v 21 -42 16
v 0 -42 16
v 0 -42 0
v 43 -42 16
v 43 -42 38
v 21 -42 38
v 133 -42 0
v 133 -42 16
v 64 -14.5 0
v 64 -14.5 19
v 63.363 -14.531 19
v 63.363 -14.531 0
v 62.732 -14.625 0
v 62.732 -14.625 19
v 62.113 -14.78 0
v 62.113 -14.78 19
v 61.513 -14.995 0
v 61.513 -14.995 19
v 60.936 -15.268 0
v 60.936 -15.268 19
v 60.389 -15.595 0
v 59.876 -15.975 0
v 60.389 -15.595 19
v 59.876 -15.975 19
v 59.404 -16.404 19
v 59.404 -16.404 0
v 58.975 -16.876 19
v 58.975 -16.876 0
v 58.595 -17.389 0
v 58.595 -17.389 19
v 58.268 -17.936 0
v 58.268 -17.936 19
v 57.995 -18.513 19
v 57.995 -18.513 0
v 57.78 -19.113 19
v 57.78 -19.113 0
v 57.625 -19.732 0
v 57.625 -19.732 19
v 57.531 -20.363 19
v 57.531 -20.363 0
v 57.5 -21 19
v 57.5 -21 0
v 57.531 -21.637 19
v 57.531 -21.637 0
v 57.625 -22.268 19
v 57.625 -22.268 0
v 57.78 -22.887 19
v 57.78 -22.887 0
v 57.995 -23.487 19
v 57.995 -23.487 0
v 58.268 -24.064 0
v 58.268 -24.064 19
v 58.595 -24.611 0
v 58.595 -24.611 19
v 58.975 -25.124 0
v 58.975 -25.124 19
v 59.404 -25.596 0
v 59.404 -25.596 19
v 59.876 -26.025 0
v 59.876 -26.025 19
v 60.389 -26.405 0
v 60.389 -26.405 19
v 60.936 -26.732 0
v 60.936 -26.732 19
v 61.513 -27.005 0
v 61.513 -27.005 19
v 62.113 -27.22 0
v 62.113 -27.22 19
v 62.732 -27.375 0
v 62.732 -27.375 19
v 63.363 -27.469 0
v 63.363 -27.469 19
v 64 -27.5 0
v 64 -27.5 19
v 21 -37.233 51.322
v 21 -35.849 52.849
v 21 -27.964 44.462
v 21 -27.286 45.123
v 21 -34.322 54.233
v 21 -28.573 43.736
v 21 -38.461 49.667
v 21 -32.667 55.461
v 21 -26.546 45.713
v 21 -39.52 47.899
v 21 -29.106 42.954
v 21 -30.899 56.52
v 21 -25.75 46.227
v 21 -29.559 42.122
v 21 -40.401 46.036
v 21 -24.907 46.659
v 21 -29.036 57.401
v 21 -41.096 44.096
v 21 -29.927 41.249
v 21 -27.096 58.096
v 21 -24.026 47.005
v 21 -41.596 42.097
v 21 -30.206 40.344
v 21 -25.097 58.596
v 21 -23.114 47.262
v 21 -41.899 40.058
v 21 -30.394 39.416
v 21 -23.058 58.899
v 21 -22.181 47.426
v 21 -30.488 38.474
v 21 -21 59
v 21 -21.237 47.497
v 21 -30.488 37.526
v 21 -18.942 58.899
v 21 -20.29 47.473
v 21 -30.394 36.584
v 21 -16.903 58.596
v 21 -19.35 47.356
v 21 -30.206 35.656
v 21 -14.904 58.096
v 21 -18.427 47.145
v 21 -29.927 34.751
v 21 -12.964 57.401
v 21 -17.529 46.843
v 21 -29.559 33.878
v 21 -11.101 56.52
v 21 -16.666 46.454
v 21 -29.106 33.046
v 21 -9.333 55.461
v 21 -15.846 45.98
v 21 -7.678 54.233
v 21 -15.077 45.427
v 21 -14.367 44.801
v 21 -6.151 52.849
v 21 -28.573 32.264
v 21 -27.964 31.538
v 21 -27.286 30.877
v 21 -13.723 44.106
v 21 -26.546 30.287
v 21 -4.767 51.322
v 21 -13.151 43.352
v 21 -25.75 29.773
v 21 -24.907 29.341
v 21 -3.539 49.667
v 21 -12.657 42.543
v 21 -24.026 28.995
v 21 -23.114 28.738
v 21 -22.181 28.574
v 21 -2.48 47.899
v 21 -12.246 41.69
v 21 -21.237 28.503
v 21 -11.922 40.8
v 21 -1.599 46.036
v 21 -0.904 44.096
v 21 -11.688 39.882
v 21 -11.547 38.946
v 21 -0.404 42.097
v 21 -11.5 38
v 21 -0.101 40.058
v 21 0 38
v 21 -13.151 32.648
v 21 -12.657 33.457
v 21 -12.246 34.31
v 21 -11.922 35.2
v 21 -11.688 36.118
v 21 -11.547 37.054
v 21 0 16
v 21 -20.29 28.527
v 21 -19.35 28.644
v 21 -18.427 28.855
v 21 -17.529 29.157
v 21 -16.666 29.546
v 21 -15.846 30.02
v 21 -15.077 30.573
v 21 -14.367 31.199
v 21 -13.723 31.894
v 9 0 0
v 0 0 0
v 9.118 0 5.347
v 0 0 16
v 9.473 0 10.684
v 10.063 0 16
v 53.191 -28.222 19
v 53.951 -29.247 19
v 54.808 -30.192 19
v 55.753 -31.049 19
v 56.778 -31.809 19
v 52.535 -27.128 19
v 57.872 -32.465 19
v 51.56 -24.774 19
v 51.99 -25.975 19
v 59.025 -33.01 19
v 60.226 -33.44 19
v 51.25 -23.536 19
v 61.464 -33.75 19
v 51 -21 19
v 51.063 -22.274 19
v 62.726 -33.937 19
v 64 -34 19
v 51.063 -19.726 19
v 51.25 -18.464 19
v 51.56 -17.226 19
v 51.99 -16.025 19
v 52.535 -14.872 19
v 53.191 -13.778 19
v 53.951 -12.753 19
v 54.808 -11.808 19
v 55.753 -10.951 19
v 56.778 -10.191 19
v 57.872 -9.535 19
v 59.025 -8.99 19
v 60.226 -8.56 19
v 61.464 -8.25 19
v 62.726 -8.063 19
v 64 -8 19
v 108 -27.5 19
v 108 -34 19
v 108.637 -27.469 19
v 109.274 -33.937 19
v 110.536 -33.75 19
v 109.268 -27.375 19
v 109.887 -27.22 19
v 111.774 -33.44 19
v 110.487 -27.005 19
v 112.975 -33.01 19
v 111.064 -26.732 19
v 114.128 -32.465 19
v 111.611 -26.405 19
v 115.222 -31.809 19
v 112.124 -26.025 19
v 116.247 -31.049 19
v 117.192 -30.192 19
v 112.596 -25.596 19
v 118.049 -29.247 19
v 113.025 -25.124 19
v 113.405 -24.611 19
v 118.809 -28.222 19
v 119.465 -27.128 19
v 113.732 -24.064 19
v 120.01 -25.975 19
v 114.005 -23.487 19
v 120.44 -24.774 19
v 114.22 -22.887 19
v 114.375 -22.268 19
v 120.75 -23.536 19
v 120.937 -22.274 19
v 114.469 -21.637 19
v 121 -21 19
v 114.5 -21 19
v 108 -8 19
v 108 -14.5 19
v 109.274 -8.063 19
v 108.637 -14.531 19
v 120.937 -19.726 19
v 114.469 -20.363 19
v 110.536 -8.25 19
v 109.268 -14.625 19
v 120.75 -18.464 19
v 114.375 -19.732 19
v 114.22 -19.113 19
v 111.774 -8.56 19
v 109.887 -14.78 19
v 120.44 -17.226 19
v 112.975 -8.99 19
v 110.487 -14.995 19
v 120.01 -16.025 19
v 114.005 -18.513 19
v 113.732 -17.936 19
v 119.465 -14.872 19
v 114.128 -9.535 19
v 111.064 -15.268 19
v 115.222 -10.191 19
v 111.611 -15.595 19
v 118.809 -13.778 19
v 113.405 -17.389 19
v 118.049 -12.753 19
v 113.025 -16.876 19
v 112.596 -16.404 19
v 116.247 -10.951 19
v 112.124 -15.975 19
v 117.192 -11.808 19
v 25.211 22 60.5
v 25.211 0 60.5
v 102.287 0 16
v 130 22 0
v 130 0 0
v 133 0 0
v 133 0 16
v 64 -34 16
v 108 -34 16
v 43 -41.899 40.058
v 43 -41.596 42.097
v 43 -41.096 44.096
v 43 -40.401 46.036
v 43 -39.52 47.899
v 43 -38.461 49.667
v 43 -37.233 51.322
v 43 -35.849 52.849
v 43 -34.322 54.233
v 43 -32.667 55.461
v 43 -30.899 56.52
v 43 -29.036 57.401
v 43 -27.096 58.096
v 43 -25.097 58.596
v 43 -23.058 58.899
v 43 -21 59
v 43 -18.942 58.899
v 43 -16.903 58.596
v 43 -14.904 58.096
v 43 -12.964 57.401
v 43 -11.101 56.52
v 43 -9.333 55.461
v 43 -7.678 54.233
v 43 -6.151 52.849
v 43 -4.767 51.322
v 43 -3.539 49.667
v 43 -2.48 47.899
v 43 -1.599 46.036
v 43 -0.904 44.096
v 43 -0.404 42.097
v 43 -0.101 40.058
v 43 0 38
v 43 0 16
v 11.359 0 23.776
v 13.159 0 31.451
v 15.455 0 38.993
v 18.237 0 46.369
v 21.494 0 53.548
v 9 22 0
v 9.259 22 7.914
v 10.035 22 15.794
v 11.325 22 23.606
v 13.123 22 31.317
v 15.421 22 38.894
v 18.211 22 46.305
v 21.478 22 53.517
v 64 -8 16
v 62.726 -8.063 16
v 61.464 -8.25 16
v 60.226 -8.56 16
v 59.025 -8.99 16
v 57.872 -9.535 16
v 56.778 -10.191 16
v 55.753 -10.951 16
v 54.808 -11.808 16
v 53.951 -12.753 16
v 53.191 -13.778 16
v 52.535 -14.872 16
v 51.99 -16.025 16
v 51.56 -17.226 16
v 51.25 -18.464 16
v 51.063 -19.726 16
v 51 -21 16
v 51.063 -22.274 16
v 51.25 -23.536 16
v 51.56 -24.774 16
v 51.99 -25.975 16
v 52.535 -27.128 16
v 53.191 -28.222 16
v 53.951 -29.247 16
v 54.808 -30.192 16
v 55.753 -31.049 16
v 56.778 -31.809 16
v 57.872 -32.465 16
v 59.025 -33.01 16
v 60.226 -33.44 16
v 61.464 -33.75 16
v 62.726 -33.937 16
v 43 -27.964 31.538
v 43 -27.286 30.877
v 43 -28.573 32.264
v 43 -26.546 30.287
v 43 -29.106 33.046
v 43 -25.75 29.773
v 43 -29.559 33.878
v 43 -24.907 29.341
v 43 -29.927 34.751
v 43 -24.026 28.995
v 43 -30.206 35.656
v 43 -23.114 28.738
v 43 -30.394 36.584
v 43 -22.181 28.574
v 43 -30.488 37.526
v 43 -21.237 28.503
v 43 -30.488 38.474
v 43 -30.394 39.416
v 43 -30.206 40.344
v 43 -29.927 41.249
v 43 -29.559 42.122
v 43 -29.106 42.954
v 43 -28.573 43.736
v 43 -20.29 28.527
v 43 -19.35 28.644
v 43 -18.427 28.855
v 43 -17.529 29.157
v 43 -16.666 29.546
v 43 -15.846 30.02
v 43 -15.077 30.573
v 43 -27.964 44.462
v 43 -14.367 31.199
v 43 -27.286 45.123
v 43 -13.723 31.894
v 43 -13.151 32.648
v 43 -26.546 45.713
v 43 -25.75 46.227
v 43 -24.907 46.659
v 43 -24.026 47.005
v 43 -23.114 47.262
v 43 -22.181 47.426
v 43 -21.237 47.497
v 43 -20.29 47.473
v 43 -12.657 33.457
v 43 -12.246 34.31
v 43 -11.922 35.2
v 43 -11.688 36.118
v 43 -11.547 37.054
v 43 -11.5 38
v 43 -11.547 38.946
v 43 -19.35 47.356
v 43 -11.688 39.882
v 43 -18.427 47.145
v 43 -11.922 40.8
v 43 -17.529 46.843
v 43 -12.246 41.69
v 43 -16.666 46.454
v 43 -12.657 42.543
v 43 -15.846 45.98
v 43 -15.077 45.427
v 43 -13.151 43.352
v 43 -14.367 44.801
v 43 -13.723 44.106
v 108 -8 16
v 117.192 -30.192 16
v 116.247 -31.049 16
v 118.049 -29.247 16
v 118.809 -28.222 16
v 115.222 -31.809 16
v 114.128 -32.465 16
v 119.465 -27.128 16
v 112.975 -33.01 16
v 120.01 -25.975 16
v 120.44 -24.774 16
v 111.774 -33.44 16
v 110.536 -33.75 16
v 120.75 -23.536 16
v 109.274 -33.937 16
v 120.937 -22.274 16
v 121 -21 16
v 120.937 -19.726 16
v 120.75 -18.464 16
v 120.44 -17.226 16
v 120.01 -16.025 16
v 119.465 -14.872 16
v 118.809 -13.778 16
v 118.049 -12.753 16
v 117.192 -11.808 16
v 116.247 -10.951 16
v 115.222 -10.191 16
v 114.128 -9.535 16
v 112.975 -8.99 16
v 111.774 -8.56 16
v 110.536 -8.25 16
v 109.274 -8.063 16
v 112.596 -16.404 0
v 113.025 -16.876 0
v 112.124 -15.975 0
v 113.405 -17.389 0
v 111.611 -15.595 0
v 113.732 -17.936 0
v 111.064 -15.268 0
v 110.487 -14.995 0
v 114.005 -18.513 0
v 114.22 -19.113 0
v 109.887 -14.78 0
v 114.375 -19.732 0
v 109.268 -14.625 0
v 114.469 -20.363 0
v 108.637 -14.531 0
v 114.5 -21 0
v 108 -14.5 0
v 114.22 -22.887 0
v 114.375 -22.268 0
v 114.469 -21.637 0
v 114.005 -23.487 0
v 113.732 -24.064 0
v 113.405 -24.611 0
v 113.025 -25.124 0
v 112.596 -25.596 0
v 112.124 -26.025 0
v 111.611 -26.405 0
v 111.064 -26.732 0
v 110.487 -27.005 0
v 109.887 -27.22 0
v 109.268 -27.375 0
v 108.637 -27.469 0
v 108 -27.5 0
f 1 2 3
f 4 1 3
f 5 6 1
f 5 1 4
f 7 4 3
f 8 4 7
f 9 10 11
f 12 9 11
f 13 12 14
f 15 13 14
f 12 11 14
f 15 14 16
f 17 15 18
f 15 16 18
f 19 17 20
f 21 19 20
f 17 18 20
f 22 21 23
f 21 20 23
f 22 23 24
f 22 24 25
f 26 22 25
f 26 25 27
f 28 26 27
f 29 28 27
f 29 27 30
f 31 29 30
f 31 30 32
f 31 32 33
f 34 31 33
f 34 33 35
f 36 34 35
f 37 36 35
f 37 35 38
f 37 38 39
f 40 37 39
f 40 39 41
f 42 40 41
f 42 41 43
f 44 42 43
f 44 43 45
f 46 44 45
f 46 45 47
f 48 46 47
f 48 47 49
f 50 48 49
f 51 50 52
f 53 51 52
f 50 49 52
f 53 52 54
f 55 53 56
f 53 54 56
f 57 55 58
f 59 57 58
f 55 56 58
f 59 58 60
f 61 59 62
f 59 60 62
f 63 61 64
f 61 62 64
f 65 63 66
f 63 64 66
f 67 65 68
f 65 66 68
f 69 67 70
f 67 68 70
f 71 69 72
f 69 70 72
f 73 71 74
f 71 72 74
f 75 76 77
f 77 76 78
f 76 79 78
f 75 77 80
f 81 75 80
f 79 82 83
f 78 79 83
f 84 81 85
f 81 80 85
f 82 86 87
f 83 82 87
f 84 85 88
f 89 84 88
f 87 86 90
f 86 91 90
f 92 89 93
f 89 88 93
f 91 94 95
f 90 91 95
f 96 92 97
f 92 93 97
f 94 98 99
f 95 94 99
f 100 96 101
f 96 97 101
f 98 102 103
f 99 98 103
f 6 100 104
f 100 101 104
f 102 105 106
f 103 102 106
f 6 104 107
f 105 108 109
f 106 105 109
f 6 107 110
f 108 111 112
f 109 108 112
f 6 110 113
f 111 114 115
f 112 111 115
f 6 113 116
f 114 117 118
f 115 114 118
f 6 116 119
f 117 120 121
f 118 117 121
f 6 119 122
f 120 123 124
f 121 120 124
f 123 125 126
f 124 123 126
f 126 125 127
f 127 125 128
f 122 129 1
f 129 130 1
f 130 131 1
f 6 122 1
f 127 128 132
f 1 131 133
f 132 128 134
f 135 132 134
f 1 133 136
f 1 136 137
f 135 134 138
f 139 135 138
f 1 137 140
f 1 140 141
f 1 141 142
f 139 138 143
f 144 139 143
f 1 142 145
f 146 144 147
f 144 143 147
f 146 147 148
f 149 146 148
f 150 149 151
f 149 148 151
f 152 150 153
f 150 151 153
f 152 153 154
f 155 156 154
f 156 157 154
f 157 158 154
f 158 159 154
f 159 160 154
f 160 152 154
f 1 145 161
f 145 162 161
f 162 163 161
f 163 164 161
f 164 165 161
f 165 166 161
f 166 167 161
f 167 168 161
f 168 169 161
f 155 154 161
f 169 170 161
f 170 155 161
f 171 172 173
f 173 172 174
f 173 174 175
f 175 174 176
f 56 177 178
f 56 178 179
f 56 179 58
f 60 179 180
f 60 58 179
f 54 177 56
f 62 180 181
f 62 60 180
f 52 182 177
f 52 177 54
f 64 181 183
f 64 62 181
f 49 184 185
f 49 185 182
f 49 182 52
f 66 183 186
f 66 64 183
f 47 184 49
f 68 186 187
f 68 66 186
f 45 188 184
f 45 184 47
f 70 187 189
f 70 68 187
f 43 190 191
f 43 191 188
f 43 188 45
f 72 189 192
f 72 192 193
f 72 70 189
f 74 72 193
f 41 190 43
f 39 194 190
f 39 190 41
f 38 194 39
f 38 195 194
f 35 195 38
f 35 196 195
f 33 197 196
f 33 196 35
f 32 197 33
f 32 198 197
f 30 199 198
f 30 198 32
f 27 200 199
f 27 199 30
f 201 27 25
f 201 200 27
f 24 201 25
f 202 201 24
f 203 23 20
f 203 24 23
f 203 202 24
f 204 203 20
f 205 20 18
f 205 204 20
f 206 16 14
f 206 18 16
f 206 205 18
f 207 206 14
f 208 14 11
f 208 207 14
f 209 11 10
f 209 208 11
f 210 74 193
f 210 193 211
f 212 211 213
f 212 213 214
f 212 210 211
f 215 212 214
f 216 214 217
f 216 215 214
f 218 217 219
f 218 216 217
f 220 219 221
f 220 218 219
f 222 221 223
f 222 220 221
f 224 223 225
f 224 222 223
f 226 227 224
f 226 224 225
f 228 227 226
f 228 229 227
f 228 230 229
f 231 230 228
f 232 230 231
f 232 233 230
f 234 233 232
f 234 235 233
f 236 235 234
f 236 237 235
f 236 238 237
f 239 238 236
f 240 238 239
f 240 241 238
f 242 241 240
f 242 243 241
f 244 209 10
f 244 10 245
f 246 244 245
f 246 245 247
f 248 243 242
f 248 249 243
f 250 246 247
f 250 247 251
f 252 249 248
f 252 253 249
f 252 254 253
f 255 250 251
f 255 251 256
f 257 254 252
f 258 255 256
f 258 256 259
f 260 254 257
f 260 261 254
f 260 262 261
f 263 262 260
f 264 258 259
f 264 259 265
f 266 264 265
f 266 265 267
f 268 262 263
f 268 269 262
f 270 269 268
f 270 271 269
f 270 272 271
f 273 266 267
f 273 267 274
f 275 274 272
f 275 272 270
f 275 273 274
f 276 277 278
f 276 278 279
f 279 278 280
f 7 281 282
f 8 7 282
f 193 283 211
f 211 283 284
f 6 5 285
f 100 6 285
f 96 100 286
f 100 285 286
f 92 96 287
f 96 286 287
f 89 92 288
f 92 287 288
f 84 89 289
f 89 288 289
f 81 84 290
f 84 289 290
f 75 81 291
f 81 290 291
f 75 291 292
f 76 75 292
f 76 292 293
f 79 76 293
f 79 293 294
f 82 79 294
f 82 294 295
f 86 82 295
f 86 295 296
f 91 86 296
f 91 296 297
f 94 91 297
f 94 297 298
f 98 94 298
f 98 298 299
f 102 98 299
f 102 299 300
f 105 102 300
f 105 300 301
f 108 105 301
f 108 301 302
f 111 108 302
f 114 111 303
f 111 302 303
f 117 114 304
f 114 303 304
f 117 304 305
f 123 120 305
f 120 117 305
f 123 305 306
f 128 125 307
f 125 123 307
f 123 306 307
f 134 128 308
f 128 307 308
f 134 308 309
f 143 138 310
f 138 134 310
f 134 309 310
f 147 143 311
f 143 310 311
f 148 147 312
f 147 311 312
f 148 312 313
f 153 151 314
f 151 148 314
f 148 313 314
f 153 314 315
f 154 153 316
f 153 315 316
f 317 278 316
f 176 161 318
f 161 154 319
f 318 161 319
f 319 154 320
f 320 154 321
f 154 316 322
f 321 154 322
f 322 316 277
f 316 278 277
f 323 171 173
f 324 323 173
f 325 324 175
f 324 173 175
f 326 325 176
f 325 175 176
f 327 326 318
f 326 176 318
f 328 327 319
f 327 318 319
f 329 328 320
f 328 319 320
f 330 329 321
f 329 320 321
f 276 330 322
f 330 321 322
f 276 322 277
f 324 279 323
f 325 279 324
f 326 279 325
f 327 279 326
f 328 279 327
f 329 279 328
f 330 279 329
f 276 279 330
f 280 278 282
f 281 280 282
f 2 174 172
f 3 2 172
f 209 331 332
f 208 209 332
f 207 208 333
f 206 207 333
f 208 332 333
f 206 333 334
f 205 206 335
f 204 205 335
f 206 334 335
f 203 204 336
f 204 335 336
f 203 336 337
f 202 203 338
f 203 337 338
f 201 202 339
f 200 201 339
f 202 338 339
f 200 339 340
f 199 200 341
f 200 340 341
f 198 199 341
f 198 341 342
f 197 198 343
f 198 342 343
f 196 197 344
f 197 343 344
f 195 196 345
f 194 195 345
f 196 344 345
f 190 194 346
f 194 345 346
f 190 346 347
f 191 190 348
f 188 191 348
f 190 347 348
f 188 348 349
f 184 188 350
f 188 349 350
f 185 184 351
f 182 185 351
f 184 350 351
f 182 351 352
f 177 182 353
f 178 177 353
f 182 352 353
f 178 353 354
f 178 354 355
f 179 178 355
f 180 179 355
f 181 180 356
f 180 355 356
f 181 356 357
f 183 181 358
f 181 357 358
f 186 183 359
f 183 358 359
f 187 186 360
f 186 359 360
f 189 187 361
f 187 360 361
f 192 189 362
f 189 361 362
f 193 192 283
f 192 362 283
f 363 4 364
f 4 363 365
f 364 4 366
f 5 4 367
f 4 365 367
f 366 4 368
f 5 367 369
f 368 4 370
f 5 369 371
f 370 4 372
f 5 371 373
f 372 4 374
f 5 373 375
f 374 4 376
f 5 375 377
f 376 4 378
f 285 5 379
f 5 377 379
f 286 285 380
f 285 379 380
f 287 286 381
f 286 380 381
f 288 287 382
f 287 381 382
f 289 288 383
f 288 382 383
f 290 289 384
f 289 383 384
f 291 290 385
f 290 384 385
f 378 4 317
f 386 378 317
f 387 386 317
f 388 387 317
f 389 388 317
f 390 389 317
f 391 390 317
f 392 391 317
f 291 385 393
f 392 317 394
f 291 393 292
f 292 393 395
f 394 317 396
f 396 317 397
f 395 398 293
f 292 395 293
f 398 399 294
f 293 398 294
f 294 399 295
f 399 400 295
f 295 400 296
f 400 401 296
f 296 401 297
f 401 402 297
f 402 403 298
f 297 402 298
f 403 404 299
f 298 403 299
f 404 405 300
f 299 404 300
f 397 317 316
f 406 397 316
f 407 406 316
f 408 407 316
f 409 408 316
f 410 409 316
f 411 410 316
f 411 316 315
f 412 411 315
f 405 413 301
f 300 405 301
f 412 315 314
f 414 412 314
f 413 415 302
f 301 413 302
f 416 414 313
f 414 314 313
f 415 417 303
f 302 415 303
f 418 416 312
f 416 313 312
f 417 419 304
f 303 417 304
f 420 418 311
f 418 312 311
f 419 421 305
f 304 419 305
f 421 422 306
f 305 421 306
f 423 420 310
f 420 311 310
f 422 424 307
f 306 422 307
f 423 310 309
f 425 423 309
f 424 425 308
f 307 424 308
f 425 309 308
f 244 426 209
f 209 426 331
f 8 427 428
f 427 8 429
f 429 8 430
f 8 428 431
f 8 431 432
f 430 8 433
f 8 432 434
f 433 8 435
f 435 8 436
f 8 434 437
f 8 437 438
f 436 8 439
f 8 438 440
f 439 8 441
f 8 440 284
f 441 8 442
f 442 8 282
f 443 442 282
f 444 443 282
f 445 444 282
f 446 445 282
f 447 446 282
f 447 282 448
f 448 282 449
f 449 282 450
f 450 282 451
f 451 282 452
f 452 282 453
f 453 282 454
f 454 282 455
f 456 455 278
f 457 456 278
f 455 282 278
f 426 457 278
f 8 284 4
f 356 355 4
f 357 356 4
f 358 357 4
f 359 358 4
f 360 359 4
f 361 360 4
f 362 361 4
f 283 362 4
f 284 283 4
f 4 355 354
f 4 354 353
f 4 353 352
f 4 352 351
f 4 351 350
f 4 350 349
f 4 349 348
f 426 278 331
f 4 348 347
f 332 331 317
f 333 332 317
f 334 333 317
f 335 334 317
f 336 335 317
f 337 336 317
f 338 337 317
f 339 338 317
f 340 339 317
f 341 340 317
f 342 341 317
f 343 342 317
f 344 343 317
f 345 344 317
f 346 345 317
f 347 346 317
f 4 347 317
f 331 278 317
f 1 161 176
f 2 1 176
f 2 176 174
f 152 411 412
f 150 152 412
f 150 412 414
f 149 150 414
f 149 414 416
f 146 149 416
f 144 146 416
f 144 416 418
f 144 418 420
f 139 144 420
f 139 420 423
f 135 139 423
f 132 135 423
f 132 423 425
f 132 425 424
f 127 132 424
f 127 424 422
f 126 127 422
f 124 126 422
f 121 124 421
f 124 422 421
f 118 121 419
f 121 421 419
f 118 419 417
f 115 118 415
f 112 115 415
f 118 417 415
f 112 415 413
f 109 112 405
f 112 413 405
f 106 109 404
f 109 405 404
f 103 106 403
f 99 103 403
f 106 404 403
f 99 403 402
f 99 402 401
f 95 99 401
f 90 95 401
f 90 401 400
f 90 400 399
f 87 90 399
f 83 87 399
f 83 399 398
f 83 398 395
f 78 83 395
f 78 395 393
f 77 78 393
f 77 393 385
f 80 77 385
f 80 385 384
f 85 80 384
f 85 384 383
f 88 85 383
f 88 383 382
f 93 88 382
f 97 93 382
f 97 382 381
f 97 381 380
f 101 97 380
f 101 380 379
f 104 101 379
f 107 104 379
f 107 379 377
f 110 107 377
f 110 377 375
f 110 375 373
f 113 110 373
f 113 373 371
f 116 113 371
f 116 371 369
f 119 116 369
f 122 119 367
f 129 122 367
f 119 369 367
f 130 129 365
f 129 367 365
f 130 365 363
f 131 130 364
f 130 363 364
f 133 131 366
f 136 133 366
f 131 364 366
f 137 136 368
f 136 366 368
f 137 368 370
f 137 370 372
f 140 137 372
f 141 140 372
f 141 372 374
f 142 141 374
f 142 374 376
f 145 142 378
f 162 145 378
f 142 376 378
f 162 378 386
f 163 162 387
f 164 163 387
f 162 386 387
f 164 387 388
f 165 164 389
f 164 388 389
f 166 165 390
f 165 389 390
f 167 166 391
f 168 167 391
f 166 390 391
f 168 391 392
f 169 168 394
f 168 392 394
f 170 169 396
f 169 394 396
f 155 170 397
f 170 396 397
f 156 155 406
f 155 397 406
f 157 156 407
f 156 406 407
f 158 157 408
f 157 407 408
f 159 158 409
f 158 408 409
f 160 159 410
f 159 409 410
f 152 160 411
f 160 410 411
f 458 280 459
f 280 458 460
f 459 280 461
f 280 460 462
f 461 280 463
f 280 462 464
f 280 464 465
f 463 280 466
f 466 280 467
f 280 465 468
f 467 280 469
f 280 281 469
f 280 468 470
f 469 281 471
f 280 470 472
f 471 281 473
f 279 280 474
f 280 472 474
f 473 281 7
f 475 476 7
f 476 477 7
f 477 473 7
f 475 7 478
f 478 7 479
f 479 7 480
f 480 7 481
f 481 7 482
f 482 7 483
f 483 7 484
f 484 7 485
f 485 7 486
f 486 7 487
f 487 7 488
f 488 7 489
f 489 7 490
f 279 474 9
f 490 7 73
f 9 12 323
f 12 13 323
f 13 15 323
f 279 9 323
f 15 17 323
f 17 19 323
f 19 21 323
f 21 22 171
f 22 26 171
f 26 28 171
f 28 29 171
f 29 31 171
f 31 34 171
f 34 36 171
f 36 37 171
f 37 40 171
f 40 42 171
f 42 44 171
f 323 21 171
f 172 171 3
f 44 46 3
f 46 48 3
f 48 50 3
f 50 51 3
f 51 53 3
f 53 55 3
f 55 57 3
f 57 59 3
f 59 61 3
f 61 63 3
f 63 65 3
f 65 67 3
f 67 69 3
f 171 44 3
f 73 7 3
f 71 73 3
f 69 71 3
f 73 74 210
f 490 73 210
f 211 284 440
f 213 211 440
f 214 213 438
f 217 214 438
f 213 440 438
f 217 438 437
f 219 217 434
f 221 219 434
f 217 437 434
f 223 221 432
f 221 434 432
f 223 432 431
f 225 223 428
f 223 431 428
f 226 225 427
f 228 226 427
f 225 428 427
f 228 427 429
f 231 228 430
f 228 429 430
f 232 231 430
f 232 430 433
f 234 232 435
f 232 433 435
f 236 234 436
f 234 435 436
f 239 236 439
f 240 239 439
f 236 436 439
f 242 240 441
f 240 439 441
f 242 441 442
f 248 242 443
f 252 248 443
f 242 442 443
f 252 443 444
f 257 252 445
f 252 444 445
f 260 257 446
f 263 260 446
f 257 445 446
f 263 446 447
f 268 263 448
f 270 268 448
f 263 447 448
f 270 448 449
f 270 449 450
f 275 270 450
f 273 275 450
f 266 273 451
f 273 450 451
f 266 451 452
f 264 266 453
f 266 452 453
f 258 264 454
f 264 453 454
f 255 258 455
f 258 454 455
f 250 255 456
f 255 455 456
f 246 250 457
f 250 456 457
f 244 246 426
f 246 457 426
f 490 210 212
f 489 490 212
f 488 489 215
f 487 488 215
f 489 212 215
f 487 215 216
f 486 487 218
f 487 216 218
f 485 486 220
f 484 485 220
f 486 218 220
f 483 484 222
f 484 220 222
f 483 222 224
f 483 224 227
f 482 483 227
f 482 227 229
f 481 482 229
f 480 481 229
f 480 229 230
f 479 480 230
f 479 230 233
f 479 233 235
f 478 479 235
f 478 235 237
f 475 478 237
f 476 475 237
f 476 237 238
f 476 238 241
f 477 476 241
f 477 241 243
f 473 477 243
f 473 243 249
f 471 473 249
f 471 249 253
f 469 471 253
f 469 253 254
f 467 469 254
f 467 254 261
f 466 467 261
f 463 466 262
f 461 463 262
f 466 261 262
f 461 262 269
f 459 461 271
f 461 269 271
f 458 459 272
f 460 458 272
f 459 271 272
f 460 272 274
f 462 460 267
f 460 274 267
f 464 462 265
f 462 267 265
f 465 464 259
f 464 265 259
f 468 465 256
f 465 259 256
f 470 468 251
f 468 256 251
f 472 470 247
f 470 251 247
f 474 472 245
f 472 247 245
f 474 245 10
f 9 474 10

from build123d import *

# Parameters (mm, degrees)
F1_DEPTH = 42
F2_R     = 9.5
F3_DEPTH = 43.001
F5_DEPTH = 3
F7_DEPTH = 19.001
F9_DEPTH = 22


with BuildPart() as f1:
    # F0 (on Front) → F1 (new body)
    with BuildSketch(Plane.XZ):
        Polygon((0, 16), (0, 0), (133, 0), (133, 16), (43, 16), (43, 86), (21, 86), (21, 16), align=None)
    extrude(amount=F1_DEPTH)

    # F2 (on face) → F3 (cut, through all)
    with BuildSketch(Plane.YZ.offset(43)):
        with Locations((-21, 38)):
            Circle(F2_R)
        with BuildLine():
            Line((-42, 86), (-42, 38))
            ThreePointArc((-42, 38), (-21, 59), (0, 38))
            Line((0, 38), (0, 86))
            Line((0, 86), (-42, 86))
        make_face()
    extrude(amount=-F3_DEPTH, mode=Mode.SUBTRACT)

    # F4 (on face) → F5 (join)
    with BuildSketch(Plane.XY.offset(16)):
        with BuildLine():
            Line((108, -8), (64, -8))
            ThreePointArc((64, -8), (51, -21), (64, -34))
            Line((64, -34), (108, -34))
            ThreePointArc((108, -34), (121, -21), (108, -8))
        make_face()
    extrude(amount=F5_DEPTH)

    # F6 (on face) → F7 (cut, through all)
    with BuildSketch(Plane.XY.offset(19)):
        with BuildLine():
            Line((108, -14.5), (64, -14.5))
            ThreePointArc((64, -14.5), (57.5, -21), (64, -27.5))
            Line((64, -27.5), (108, -27.5))
            ThreePointArc((108, -27.5), (114.5, -21), (108, -14.5))
        make_face()
    extrude(amount=-F7_DEPTH, mode=Mode.SUBTRACT)

    # F8 (on face) → F9 (join)
    with BuildSketch(Plane(origin=(0, 0, 0), x_dir=(-1, 0, 0), z_dir=(0, 1, 0))):
        with BuildLine():
            Line((-25.210926, 60.5), (-130, 0))
            Line((-130, 0), (-9, 0))
            ThreePointArc((-9, 0), (-13.122975, 31.317104), (-25.210926, 60.5))
        make_face()
    extrude(amount=F9_DEPTH)


solid = f1.part
